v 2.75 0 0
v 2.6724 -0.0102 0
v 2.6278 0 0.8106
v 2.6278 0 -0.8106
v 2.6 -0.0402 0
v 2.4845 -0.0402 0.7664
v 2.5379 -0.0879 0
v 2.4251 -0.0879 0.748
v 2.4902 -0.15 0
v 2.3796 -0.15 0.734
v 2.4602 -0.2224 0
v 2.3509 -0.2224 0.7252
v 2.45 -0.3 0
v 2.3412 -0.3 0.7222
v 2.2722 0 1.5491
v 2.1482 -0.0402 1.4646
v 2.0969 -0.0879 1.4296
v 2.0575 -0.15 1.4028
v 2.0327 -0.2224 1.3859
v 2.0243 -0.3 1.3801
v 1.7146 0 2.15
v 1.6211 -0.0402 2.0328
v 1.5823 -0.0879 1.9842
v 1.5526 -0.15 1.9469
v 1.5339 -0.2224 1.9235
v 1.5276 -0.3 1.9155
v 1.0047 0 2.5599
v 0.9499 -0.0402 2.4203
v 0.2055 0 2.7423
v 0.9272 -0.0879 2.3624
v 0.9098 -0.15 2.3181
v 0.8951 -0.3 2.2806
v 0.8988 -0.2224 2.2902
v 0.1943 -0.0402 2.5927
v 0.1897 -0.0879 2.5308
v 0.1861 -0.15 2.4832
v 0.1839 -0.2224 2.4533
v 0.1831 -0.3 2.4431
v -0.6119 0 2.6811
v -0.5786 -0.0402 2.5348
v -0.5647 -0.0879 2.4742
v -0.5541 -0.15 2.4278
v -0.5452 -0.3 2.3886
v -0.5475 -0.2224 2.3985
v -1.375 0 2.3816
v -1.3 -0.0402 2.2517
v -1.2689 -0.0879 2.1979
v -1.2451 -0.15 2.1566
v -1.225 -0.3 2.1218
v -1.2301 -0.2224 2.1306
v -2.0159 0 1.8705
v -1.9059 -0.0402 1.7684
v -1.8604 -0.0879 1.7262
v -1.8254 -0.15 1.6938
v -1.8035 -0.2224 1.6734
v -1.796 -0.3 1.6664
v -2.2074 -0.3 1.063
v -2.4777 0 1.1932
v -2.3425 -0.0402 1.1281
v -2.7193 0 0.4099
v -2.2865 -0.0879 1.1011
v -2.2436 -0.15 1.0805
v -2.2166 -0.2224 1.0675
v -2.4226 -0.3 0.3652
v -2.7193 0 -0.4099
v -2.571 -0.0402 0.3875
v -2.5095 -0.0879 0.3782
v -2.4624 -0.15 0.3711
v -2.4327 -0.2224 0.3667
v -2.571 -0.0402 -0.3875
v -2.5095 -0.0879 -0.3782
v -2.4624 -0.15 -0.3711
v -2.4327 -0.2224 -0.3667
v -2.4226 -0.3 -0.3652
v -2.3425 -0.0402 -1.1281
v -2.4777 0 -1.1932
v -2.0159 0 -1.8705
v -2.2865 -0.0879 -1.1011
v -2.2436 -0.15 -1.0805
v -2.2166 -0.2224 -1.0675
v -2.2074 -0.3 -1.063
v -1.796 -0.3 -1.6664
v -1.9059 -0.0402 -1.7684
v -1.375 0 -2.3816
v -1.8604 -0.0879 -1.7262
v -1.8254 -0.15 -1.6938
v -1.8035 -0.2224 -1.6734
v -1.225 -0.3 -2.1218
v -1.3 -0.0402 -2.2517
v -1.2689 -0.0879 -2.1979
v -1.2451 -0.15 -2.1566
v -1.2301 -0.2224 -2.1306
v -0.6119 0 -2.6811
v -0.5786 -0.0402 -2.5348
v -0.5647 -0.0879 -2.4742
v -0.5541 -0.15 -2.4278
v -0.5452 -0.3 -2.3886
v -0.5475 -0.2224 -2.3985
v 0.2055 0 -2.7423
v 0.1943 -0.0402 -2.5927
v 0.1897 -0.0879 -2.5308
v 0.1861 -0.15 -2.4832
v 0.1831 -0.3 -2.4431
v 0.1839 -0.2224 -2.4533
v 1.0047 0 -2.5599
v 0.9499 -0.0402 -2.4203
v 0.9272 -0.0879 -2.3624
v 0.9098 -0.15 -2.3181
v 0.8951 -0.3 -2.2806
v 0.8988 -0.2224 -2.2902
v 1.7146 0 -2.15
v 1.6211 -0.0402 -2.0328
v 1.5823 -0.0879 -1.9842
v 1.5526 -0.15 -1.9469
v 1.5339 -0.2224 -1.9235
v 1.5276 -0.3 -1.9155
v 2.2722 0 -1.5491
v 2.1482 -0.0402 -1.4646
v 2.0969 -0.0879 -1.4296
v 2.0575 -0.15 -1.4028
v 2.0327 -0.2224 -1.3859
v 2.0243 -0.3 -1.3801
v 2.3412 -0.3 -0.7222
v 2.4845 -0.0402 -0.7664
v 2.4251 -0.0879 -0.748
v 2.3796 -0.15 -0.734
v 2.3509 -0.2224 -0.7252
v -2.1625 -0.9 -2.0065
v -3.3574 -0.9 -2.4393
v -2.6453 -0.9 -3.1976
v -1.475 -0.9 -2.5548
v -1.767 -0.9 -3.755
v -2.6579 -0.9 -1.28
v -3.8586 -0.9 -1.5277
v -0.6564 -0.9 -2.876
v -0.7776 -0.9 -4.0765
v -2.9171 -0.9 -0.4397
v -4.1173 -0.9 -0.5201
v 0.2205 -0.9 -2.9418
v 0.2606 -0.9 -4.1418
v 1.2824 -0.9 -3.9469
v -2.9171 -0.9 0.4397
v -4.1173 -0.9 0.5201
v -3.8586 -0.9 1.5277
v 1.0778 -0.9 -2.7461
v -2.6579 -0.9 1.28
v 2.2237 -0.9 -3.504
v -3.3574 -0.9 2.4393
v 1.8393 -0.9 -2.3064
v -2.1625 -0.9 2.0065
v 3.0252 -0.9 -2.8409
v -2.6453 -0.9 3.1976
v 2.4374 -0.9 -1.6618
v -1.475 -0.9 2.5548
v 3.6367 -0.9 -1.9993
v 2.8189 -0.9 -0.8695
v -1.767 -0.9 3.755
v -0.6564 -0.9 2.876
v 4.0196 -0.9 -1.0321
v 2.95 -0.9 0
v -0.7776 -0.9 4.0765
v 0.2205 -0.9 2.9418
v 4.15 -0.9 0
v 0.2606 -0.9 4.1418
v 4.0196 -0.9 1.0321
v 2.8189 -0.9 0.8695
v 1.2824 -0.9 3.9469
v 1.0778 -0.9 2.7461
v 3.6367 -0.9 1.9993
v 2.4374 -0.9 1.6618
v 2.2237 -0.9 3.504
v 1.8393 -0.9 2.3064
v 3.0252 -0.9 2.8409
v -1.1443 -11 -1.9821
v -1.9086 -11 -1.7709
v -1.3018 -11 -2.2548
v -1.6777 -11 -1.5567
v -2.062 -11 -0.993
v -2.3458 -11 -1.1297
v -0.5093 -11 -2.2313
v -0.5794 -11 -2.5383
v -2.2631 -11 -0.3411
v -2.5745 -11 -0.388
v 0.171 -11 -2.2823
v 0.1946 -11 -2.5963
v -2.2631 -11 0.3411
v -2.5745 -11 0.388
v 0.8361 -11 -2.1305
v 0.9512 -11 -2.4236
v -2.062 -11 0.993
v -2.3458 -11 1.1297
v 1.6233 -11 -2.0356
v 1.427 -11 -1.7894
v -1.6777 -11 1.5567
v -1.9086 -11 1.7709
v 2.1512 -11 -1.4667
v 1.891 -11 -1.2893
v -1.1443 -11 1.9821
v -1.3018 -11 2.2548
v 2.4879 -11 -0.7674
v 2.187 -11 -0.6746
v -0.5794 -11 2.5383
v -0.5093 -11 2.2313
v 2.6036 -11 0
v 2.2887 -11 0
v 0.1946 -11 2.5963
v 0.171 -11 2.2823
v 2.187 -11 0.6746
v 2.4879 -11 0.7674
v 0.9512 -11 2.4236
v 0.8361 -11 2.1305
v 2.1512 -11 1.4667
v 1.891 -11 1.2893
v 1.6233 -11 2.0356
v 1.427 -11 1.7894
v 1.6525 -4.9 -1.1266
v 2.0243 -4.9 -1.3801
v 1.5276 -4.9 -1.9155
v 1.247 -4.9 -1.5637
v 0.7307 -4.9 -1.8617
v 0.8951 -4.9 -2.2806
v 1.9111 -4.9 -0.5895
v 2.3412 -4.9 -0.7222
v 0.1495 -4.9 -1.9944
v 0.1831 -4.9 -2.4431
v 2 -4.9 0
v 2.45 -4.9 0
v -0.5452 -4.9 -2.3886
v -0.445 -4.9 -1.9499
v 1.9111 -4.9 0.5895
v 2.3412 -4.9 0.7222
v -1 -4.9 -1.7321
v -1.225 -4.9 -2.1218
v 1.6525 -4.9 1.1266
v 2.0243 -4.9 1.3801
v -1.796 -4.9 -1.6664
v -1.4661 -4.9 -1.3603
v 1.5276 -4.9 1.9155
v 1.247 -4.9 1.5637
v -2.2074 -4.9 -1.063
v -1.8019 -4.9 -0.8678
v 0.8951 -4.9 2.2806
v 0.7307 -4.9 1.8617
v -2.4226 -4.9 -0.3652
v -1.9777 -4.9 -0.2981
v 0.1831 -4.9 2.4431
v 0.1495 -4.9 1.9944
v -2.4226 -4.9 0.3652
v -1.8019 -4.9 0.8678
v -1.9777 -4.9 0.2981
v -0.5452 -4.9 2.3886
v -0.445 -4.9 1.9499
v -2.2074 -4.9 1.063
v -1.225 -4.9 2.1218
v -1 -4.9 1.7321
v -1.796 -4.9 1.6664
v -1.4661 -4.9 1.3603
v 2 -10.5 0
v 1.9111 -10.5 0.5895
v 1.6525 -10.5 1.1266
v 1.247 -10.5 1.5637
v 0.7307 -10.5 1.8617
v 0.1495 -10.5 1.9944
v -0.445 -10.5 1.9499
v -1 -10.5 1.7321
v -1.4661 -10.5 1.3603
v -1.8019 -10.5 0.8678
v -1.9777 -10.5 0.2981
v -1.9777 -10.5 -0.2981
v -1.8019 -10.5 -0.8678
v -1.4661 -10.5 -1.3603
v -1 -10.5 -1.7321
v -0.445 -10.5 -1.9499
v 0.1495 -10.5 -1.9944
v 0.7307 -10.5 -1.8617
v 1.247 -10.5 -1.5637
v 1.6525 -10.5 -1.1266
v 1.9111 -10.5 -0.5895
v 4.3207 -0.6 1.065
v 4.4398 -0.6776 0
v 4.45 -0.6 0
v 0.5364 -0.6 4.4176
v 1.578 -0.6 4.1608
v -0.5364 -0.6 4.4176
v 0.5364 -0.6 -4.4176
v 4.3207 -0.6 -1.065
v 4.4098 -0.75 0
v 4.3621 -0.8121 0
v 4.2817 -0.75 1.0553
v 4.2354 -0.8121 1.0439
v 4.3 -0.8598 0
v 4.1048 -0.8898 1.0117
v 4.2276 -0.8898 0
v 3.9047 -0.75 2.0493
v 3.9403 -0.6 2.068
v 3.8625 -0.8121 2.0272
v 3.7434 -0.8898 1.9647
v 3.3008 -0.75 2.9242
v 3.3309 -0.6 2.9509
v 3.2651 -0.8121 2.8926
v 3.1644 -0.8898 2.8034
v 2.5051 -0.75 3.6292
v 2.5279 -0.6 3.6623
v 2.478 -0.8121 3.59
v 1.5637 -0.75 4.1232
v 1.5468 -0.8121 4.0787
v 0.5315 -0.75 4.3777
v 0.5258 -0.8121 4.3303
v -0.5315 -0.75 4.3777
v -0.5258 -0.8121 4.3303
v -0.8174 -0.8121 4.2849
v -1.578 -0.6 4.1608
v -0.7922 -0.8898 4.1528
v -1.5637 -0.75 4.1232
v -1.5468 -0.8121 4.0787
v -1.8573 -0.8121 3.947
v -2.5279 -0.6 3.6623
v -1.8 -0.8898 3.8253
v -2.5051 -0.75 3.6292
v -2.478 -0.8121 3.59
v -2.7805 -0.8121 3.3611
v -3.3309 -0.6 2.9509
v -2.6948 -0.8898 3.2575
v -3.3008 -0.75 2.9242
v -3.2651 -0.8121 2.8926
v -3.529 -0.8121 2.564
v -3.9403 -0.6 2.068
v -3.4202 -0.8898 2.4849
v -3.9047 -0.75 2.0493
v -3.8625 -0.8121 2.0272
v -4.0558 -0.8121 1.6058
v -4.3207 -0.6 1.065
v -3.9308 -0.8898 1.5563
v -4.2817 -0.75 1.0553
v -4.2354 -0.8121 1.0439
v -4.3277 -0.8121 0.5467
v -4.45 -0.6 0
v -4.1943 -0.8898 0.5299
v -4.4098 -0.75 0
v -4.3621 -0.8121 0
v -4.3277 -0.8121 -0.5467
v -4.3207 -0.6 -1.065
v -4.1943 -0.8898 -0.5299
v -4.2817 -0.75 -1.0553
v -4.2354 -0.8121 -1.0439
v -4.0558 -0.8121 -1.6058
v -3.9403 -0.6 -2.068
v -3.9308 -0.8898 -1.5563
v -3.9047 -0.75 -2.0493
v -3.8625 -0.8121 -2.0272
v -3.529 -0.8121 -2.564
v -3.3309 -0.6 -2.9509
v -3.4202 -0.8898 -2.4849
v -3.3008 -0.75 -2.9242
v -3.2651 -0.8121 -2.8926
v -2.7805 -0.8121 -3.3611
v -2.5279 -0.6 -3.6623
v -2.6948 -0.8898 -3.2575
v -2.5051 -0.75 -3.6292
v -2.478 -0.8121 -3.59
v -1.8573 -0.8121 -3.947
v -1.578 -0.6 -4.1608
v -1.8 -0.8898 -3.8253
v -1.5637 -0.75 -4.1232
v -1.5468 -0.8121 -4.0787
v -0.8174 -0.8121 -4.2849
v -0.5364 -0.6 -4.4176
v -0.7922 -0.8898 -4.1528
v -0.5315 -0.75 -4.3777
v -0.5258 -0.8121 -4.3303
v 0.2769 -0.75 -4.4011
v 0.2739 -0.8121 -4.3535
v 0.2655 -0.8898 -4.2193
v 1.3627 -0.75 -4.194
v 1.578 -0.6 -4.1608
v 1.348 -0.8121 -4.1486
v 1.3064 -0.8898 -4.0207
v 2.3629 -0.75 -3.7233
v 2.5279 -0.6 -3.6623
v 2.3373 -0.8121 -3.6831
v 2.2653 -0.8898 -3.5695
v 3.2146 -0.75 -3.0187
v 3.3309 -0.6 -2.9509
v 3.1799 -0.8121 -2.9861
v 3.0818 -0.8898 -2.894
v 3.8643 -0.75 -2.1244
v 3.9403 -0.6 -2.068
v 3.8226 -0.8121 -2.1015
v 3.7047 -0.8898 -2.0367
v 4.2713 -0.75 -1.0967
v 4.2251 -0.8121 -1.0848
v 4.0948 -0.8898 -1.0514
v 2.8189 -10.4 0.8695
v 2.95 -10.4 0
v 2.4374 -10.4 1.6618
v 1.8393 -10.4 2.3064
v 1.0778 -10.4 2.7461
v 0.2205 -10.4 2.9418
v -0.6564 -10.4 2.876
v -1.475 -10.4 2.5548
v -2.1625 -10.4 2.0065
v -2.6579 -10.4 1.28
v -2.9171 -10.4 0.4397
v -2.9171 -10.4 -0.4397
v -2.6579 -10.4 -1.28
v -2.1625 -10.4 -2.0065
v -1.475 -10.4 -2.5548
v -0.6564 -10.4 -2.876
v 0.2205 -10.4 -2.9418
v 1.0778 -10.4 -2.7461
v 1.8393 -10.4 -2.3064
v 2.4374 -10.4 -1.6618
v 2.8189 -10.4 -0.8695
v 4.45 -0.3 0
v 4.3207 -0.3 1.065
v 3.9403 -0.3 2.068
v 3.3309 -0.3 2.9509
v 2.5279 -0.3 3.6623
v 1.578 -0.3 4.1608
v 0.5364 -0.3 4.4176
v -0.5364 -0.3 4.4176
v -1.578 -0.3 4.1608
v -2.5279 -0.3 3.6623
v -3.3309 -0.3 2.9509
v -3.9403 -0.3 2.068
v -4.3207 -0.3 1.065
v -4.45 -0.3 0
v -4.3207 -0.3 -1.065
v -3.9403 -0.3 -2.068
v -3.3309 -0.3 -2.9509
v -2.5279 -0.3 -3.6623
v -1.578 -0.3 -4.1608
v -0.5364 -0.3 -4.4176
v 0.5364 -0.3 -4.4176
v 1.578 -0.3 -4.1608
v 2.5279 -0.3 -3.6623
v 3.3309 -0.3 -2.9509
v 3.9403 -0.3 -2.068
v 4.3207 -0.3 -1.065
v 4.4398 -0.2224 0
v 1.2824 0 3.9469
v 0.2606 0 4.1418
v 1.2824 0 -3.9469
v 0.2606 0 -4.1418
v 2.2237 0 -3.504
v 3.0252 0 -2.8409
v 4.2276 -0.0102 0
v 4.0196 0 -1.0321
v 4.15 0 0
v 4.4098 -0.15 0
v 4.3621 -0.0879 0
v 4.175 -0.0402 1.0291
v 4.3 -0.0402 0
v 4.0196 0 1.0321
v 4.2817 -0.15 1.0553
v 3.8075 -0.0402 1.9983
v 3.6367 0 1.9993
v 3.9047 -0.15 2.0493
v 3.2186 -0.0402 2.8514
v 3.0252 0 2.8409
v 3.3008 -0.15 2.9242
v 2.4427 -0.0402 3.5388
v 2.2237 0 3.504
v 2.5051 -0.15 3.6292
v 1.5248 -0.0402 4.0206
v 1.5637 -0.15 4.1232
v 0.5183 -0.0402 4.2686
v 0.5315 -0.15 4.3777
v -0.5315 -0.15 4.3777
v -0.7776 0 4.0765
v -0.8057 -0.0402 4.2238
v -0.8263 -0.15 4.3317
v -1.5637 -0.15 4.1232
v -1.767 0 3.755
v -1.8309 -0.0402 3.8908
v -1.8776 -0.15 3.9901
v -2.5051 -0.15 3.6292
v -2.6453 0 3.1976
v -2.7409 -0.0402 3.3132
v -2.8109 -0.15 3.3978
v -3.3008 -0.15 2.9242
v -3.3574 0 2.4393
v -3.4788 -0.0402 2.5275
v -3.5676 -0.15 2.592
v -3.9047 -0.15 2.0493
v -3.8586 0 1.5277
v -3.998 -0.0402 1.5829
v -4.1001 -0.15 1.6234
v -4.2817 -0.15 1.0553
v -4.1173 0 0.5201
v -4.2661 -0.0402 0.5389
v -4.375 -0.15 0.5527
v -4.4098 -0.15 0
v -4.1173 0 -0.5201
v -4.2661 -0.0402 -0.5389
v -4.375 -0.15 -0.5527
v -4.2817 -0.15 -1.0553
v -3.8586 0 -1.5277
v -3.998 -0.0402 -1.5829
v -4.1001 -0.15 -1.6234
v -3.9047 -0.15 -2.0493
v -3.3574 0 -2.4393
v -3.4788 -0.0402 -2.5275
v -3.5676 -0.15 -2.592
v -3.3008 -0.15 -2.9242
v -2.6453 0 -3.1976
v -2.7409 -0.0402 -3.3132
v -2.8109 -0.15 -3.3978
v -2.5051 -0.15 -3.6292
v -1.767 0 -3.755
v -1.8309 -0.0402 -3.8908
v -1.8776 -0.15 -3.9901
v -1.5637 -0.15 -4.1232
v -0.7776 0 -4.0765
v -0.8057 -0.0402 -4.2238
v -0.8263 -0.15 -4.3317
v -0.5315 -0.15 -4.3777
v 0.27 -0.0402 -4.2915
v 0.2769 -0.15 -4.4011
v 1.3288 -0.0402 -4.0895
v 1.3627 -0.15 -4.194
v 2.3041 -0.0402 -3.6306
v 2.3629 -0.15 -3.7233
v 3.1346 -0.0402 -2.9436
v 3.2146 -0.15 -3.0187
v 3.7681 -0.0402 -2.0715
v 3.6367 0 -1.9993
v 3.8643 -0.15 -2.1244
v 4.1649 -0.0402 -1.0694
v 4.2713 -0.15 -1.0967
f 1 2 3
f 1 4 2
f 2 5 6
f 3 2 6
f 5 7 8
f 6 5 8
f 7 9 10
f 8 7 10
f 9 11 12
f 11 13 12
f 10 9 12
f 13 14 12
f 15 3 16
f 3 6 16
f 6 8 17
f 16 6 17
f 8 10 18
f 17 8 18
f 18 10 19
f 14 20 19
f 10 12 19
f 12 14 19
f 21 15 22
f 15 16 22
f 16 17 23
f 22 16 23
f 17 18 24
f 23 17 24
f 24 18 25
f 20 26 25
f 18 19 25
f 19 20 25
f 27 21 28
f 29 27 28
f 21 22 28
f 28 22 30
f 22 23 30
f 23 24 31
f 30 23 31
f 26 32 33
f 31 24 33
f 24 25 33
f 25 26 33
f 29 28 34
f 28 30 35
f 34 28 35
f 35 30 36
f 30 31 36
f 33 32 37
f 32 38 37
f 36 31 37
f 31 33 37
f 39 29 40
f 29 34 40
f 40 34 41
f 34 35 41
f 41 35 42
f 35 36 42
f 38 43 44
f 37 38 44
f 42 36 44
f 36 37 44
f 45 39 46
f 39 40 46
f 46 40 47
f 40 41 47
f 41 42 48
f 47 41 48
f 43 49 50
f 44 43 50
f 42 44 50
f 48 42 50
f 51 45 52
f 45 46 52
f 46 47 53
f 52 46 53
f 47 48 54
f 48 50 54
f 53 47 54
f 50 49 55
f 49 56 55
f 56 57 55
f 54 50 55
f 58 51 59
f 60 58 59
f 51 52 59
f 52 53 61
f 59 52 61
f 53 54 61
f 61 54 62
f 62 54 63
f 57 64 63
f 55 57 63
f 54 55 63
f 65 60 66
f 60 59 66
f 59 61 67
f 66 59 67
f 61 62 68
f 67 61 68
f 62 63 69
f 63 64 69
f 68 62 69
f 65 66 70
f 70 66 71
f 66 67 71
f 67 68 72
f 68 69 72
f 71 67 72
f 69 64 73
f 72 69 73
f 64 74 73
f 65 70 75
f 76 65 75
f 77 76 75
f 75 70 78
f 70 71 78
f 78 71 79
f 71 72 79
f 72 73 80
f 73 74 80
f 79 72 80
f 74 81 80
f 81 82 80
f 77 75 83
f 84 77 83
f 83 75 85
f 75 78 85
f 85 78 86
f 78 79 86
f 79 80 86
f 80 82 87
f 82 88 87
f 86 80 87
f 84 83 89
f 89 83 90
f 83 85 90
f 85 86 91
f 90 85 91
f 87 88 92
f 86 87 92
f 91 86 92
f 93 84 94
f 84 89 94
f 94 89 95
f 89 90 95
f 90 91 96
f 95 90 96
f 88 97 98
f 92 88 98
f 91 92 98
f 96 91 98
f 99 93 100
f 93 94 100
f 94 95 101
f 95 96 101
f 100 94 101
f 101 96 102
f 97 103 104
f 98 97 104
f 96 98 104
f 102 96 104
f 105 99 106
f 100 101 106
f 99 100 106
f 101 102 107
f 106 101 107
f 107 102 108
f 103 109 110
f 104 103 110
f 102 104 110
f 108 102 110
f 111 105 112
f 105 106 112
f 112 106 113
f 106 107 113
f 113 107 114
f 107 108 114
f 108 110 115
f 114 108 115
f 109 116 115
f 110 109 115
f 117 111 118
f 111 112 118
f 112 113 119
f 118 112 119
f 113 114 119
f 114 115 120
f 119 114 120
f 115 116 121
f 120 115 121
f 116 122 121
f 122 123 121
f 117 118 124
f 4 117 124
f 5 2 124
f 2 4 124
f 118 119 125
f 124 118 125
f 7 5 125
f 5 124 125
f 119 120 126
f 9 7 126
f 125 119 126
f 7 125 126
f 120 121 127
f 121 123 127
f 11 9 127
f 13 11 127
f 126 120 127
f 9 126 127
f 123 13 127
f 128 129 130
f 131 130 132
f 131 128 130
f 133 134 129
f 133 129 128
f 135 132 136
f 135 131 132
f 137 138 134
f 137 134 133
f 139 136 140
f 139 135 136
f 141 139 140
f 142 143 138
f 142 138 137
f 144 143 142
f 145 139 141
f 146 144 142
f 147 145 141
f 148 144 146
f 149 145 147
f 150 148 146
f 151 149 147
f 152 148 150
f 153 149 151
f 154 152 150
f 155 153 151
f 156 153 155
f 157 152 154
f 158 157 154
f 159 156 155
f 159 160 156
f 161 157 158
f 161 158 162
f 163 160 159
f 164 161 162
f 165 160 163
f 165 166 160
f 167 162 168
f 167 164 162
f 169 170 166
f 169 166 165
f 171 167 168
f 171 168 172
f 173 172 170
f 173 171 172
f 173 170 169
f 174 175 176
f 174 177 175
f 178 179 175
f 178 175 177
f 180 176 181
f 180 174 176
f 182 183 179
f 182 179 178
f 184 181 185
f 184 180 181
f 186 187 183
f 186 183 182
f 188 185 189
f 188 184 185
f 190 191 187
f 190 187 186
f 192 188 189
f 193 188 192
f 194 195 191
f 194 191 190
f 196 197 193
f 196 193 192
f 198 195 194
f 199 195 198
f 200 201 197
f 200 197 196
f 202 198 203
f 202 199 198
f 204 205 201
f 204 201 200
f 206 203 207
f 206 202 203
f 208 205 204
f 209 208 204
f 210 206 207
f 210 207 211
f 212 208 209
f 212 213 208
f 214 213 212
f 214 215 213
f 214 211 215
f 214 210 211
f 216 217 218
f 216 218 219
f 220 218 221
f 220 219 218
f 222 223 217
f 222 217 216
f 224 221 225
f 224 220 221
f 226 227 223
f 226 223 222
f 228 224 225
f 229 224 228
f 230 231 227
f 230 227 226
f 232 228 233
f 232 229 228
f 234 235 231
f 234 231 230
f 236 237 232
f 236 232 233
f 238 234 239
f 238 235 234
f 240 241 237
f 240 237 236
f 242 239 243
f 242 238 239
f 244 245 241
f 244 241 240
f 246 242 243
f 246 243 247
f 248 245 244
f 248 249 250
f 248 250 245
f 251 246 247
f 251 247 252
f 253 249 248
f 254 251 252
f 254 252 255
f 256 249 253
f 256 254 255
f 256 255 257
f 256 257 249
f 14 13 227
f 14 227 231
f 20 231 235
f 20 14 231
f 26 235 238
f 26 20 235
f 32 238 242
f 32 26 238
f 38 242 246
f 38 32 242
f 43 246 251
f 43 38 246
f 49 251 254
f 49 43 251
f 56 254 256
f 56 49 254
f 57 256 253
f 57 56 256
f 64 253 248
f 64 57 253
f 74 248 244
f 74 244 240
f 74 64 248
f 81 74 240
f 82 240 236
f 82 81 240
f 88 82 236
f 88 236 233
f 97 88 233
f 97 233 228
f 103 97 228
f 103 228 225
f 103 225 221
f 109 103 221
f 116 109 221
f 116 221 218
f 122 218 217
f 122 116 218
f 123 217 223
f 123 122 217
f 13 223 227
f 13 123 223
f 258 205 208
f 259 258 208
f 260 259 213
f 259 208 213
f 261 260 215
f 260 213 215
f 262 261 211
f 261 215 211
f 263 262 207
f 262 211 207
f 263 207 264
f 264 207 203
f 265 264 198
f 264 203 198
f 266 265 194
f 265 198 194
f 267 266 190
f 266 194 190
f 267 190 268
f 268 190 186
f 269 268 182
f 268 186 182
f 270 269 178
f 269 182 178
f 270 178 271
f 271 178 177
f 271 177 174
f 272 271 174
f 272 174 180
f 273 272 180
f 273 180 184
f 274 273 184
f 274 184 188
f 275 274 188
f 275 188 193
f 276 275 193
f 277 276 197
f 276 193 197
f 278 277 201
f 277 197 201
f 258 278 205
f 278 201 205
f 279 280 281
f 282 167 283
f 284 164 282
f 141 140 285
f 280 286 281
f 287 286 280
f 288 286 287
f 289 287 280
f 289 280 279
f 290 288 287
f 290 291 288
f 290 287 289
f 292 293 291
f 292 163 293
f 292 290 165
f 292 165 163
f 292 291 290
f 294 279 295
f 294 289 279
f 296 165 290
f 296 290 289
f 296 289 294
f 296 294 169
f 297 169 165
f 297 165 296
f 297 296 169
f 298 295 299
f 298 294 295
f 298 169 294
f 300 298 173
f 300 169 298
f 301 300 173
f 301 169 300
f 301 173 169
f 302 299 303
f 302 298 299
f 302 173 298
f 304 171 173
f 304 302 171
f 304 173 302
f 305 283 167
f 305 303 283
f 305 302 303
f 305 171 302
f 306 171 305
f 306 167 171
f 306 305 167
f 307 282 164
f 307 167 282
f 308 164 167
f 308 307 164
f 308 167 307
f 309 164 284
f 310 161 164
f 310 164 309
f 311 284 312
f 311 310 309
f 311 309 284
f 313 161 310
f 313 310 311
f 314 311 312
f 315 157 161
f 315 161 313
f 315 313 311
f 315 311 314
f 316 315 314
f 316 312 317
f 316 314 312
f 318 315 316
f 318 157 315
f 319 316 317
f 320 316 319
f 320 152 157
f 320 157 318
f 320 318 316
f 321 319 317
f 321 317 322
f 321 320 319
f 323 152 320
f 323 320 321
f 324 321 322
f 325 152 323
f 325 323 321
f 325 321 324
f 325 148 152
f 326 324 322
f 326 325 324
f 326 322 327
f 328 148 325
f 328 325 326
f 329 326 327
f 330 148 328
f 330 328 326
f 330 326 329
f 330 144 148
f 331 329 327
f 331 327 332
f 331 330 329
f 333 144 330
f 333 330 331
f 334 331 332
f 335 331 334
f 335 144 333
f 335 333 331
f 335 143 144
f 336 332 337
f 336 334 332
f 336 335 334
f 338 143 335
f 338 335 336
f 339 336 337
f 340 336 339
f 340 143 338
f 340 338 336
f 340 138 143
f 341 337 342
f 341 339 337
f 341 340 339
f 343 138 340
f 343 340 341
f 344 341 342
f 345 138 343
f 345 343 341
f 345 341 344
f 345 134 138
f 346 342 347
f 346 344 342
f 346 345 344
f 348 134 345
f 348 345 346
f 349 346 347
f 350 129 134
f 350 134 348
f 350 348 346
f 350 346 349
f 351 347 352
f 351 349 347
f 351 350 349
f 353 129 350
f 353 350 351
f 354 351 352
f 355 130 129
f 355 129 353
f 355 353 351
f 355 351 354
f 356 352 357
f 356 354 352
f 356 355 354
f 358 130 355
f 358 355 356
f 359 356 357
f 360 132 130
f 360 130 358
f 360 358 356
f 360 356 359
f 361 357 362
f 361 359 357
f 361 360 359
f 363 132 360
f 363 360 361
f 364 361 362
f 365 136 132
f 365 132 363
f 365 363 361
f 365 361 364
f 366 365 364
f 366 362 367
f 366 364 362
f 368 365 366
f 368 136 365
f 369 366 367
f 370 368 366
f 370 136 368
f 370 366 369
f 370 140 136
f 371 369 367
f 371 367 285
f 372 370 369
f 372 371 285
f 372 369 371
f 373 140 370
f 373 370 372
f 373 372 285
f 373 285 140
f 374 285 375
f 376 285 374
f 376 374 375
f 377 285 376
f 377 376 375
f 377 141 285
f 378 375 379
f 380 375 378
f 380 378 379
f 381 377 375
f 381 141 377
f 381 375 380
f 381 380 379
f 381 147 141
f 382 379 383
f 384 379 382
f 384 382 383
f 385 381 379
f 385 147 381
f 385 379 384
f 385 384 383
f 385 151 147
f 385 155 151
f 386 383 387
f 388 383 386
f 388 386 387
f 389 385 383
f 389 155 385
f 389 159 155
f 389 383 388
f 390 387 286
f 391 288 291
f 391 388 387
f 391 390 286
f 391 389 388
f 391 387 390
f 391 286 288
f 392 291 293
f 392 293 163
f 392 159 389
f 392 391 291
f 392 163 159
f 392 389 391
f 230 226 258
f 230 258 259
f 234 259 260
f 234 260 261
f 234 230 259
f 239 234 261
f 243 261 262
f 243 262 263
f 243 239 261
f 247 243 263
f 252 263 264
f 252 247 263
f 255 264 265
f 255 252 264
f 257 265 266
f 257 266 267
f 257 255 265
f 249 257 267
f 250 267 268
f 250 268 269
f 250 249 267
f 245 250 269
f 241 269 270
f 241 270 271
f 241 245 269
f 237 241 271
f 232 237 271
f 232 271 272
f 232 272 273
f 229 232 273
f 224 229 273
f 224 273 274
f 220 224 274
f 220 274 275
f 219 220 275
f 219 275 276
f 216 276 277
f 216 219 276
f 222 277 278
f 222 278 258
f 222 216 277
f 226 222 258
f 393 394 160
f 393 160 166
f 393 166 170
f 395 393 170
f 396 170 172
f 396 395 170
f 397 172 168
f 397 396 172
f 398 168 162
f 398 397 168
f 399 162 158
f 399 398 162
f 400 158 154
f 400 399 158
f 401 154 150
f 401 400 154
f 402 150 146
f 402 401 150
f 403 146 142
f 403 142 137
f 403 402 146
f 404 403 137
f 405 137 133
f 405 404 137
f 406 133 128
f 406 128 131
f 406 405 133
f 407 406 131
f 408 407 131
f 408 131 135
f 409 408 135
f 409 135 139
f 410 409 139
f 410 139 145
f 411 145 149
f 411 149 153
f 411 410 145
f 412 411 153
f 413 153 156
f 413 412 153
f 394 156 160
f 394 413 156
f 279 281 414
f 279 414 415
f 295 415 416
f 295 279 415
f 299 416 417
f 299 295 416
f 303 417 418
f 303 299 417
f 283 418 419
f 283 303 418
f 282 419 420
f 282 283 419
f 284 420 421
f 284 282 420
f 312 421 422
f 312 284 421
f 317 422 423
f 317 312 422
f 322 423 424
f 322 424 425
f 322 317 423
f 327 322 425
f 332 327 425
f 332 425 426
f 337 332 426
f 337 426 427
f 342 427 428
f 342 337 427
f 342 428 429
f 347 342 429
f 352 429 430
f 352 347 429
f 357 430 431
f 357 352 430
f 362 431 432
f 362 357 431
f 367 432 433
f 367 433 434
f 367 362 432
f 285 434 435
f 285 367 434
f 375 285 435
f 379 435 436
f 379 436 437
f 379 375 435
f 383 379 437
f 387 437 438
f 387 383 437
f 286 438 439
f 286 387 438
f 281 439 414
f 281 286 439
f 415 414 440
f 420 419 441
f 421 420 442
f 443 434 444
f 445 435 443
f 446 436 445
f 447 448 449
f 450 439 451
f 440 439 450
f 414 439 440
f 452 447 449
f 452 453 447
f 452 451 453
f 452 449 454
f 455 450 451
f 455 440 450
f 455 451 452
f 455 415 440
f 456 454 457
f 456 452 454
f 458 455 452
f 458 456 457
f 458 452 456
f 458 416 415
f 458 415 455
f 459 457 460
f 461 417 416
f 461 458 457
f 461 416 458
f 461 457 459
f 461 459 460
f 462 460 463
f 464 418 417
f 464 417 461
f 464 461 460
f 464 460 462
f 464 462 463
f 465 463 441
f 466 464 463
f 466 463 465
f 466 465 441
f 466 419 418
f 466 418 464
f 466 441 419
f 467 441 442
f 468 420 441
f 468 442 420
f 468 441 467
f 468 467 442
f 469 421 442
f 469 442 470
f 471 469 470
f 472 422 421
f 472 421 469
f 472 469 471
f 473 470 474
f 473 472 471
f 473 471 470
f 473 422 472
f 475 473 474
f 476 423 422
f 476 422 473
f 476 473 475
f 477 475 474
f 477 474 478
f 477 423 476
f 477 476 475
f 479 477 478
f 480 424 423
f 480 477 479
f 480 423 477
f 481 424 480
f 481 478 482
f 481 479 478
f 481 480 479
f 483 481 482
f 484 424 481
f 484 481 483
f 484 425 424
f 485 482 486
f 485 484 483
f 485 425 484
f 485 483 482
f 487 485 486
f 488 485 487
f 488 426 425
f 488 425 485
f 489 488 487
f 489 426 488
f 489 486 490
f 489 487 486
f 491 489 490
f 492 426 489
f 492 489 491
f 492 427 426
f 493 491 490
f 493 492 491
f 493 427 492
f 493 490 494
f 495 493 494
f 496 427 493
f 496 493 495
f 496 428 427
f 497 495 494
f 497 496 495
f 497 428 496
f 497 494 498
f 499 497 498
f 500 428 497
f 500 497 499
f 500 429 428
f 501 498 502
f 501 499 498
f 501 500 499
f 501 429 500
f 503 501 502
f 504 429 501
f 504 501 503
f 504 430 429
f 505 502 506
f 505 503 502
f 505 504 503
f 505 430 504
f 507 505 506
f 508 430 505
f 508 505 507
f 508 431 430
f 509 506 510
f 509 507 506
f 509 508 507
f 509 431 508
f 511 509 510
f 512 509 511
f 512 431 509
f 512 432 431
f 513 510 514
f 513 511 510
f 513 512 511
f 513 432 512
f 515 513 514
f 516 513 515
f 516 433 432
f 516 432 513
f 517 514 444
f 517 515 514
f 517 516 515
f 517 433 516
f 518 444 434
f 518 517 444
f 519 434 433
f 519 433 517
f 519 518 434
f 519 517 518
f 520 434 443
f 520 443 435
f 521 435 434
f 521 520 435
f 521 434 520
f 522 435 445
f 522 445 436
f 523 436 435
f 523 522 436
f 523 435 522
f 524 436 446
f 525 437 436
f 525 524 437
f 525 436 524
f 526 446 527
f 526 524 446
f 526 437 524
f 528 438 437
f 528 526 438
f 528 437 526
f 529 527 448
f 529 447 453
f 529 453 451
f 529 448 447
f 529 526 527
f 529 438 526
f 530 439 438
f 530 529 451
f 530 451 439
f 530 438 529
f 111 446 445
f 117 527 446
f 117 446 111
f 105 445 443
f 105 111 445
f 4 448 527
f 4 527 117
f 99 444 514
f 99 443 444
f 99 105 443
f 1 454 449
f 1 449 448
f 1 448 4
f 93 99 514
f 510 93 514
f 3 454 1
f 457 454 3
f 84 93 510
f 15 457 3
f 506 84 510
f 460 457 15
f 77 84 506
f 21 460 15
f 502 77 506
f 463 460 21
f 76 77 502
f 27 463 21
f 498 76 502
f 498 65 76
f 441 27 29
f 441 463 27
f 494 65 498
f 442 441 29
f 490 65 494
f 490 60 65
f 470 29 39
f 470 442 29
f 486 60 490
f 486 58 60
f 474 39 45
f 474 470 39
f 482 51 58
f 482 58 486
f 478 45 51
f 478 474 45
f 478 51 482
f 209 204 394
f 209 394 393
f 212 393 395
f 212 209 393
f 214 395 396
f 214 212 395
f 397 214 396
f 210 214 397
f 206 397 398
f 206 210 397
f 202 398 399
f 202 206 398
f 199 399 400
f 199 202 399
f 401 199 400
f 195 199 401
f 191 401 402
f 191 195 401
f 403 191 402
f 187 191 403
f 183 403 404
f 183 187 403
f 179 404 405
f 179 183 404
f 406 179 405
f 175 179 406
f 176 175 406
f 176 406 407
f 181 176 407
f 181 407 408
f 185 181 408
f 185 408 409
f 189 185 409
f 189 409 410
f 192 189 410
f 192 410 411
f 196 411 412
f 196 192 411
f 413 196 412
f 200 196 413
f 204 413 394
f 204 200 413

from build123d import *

# Parameters (mm, degrees)
FILLET1_R      = 0.3
CHAMFER1_SIZE  = 0.6
CHAMFER1_SIZE2 = 0.346410162
CHAMFER2_SIZE  = 0.5
CHAMFER2_SIZE2 = 0.288675135


with BuildPart() as part:
    # Sketch1 → Revolve1 (revolve)
    with BuildSketch(Plane.XY):
        Polygon((2.45, 0), (4.45, 0), (4.45, -0.9), (2.95, -0.9), (2.95, -11), (2, -11), (2, -4.9), (2.45, -4.9), align=None)
    revolve(axis=Axis((0, 0, 0), (0, -1, 0)))

    # Fillet1
    fillet1_edges = [part.edges().sort_by_distance(p)[0] for p in [
        (-4.45, -0.9, 0),
        (-4.45, 0, 0),
        (-2.45, 0, 0),
    ]]
    fillet(fillet1_edges, radius=FILLET1_R)

    # Chamfer1
    chamfer1_edges = [part.edges().sort_by_distance(p)[0] for p in [
        (-2.95, -11, 0),
    ]]
    chamfer1_side = [part.faces().sort_by_distance(p)[0] for p in [
        (-2.95, -5.95, 0),
    ]]
    chamfer(chamfer1_edges, length=CHAMFER1_SIZE, length2=CHAMFER1_SIZE2, reference=chamfer1_side[0])

    # Chamfer2
    chamfer2_edges = [part.edges().sort_by_distance(p)[0] for p in [
        (-2, -11, 0),
    ]]
    chamfer2_side = [part.faces().sort_by_distance(p)[0] for p in [
        (-2, -7.95, 0),
    ]]
    chamfer(chamfer2_edges, length=CHAMFER2_SIZE, length2=CHAMFER2_SIZE2, reference=chamfer2_side[0])


solid = part.part
